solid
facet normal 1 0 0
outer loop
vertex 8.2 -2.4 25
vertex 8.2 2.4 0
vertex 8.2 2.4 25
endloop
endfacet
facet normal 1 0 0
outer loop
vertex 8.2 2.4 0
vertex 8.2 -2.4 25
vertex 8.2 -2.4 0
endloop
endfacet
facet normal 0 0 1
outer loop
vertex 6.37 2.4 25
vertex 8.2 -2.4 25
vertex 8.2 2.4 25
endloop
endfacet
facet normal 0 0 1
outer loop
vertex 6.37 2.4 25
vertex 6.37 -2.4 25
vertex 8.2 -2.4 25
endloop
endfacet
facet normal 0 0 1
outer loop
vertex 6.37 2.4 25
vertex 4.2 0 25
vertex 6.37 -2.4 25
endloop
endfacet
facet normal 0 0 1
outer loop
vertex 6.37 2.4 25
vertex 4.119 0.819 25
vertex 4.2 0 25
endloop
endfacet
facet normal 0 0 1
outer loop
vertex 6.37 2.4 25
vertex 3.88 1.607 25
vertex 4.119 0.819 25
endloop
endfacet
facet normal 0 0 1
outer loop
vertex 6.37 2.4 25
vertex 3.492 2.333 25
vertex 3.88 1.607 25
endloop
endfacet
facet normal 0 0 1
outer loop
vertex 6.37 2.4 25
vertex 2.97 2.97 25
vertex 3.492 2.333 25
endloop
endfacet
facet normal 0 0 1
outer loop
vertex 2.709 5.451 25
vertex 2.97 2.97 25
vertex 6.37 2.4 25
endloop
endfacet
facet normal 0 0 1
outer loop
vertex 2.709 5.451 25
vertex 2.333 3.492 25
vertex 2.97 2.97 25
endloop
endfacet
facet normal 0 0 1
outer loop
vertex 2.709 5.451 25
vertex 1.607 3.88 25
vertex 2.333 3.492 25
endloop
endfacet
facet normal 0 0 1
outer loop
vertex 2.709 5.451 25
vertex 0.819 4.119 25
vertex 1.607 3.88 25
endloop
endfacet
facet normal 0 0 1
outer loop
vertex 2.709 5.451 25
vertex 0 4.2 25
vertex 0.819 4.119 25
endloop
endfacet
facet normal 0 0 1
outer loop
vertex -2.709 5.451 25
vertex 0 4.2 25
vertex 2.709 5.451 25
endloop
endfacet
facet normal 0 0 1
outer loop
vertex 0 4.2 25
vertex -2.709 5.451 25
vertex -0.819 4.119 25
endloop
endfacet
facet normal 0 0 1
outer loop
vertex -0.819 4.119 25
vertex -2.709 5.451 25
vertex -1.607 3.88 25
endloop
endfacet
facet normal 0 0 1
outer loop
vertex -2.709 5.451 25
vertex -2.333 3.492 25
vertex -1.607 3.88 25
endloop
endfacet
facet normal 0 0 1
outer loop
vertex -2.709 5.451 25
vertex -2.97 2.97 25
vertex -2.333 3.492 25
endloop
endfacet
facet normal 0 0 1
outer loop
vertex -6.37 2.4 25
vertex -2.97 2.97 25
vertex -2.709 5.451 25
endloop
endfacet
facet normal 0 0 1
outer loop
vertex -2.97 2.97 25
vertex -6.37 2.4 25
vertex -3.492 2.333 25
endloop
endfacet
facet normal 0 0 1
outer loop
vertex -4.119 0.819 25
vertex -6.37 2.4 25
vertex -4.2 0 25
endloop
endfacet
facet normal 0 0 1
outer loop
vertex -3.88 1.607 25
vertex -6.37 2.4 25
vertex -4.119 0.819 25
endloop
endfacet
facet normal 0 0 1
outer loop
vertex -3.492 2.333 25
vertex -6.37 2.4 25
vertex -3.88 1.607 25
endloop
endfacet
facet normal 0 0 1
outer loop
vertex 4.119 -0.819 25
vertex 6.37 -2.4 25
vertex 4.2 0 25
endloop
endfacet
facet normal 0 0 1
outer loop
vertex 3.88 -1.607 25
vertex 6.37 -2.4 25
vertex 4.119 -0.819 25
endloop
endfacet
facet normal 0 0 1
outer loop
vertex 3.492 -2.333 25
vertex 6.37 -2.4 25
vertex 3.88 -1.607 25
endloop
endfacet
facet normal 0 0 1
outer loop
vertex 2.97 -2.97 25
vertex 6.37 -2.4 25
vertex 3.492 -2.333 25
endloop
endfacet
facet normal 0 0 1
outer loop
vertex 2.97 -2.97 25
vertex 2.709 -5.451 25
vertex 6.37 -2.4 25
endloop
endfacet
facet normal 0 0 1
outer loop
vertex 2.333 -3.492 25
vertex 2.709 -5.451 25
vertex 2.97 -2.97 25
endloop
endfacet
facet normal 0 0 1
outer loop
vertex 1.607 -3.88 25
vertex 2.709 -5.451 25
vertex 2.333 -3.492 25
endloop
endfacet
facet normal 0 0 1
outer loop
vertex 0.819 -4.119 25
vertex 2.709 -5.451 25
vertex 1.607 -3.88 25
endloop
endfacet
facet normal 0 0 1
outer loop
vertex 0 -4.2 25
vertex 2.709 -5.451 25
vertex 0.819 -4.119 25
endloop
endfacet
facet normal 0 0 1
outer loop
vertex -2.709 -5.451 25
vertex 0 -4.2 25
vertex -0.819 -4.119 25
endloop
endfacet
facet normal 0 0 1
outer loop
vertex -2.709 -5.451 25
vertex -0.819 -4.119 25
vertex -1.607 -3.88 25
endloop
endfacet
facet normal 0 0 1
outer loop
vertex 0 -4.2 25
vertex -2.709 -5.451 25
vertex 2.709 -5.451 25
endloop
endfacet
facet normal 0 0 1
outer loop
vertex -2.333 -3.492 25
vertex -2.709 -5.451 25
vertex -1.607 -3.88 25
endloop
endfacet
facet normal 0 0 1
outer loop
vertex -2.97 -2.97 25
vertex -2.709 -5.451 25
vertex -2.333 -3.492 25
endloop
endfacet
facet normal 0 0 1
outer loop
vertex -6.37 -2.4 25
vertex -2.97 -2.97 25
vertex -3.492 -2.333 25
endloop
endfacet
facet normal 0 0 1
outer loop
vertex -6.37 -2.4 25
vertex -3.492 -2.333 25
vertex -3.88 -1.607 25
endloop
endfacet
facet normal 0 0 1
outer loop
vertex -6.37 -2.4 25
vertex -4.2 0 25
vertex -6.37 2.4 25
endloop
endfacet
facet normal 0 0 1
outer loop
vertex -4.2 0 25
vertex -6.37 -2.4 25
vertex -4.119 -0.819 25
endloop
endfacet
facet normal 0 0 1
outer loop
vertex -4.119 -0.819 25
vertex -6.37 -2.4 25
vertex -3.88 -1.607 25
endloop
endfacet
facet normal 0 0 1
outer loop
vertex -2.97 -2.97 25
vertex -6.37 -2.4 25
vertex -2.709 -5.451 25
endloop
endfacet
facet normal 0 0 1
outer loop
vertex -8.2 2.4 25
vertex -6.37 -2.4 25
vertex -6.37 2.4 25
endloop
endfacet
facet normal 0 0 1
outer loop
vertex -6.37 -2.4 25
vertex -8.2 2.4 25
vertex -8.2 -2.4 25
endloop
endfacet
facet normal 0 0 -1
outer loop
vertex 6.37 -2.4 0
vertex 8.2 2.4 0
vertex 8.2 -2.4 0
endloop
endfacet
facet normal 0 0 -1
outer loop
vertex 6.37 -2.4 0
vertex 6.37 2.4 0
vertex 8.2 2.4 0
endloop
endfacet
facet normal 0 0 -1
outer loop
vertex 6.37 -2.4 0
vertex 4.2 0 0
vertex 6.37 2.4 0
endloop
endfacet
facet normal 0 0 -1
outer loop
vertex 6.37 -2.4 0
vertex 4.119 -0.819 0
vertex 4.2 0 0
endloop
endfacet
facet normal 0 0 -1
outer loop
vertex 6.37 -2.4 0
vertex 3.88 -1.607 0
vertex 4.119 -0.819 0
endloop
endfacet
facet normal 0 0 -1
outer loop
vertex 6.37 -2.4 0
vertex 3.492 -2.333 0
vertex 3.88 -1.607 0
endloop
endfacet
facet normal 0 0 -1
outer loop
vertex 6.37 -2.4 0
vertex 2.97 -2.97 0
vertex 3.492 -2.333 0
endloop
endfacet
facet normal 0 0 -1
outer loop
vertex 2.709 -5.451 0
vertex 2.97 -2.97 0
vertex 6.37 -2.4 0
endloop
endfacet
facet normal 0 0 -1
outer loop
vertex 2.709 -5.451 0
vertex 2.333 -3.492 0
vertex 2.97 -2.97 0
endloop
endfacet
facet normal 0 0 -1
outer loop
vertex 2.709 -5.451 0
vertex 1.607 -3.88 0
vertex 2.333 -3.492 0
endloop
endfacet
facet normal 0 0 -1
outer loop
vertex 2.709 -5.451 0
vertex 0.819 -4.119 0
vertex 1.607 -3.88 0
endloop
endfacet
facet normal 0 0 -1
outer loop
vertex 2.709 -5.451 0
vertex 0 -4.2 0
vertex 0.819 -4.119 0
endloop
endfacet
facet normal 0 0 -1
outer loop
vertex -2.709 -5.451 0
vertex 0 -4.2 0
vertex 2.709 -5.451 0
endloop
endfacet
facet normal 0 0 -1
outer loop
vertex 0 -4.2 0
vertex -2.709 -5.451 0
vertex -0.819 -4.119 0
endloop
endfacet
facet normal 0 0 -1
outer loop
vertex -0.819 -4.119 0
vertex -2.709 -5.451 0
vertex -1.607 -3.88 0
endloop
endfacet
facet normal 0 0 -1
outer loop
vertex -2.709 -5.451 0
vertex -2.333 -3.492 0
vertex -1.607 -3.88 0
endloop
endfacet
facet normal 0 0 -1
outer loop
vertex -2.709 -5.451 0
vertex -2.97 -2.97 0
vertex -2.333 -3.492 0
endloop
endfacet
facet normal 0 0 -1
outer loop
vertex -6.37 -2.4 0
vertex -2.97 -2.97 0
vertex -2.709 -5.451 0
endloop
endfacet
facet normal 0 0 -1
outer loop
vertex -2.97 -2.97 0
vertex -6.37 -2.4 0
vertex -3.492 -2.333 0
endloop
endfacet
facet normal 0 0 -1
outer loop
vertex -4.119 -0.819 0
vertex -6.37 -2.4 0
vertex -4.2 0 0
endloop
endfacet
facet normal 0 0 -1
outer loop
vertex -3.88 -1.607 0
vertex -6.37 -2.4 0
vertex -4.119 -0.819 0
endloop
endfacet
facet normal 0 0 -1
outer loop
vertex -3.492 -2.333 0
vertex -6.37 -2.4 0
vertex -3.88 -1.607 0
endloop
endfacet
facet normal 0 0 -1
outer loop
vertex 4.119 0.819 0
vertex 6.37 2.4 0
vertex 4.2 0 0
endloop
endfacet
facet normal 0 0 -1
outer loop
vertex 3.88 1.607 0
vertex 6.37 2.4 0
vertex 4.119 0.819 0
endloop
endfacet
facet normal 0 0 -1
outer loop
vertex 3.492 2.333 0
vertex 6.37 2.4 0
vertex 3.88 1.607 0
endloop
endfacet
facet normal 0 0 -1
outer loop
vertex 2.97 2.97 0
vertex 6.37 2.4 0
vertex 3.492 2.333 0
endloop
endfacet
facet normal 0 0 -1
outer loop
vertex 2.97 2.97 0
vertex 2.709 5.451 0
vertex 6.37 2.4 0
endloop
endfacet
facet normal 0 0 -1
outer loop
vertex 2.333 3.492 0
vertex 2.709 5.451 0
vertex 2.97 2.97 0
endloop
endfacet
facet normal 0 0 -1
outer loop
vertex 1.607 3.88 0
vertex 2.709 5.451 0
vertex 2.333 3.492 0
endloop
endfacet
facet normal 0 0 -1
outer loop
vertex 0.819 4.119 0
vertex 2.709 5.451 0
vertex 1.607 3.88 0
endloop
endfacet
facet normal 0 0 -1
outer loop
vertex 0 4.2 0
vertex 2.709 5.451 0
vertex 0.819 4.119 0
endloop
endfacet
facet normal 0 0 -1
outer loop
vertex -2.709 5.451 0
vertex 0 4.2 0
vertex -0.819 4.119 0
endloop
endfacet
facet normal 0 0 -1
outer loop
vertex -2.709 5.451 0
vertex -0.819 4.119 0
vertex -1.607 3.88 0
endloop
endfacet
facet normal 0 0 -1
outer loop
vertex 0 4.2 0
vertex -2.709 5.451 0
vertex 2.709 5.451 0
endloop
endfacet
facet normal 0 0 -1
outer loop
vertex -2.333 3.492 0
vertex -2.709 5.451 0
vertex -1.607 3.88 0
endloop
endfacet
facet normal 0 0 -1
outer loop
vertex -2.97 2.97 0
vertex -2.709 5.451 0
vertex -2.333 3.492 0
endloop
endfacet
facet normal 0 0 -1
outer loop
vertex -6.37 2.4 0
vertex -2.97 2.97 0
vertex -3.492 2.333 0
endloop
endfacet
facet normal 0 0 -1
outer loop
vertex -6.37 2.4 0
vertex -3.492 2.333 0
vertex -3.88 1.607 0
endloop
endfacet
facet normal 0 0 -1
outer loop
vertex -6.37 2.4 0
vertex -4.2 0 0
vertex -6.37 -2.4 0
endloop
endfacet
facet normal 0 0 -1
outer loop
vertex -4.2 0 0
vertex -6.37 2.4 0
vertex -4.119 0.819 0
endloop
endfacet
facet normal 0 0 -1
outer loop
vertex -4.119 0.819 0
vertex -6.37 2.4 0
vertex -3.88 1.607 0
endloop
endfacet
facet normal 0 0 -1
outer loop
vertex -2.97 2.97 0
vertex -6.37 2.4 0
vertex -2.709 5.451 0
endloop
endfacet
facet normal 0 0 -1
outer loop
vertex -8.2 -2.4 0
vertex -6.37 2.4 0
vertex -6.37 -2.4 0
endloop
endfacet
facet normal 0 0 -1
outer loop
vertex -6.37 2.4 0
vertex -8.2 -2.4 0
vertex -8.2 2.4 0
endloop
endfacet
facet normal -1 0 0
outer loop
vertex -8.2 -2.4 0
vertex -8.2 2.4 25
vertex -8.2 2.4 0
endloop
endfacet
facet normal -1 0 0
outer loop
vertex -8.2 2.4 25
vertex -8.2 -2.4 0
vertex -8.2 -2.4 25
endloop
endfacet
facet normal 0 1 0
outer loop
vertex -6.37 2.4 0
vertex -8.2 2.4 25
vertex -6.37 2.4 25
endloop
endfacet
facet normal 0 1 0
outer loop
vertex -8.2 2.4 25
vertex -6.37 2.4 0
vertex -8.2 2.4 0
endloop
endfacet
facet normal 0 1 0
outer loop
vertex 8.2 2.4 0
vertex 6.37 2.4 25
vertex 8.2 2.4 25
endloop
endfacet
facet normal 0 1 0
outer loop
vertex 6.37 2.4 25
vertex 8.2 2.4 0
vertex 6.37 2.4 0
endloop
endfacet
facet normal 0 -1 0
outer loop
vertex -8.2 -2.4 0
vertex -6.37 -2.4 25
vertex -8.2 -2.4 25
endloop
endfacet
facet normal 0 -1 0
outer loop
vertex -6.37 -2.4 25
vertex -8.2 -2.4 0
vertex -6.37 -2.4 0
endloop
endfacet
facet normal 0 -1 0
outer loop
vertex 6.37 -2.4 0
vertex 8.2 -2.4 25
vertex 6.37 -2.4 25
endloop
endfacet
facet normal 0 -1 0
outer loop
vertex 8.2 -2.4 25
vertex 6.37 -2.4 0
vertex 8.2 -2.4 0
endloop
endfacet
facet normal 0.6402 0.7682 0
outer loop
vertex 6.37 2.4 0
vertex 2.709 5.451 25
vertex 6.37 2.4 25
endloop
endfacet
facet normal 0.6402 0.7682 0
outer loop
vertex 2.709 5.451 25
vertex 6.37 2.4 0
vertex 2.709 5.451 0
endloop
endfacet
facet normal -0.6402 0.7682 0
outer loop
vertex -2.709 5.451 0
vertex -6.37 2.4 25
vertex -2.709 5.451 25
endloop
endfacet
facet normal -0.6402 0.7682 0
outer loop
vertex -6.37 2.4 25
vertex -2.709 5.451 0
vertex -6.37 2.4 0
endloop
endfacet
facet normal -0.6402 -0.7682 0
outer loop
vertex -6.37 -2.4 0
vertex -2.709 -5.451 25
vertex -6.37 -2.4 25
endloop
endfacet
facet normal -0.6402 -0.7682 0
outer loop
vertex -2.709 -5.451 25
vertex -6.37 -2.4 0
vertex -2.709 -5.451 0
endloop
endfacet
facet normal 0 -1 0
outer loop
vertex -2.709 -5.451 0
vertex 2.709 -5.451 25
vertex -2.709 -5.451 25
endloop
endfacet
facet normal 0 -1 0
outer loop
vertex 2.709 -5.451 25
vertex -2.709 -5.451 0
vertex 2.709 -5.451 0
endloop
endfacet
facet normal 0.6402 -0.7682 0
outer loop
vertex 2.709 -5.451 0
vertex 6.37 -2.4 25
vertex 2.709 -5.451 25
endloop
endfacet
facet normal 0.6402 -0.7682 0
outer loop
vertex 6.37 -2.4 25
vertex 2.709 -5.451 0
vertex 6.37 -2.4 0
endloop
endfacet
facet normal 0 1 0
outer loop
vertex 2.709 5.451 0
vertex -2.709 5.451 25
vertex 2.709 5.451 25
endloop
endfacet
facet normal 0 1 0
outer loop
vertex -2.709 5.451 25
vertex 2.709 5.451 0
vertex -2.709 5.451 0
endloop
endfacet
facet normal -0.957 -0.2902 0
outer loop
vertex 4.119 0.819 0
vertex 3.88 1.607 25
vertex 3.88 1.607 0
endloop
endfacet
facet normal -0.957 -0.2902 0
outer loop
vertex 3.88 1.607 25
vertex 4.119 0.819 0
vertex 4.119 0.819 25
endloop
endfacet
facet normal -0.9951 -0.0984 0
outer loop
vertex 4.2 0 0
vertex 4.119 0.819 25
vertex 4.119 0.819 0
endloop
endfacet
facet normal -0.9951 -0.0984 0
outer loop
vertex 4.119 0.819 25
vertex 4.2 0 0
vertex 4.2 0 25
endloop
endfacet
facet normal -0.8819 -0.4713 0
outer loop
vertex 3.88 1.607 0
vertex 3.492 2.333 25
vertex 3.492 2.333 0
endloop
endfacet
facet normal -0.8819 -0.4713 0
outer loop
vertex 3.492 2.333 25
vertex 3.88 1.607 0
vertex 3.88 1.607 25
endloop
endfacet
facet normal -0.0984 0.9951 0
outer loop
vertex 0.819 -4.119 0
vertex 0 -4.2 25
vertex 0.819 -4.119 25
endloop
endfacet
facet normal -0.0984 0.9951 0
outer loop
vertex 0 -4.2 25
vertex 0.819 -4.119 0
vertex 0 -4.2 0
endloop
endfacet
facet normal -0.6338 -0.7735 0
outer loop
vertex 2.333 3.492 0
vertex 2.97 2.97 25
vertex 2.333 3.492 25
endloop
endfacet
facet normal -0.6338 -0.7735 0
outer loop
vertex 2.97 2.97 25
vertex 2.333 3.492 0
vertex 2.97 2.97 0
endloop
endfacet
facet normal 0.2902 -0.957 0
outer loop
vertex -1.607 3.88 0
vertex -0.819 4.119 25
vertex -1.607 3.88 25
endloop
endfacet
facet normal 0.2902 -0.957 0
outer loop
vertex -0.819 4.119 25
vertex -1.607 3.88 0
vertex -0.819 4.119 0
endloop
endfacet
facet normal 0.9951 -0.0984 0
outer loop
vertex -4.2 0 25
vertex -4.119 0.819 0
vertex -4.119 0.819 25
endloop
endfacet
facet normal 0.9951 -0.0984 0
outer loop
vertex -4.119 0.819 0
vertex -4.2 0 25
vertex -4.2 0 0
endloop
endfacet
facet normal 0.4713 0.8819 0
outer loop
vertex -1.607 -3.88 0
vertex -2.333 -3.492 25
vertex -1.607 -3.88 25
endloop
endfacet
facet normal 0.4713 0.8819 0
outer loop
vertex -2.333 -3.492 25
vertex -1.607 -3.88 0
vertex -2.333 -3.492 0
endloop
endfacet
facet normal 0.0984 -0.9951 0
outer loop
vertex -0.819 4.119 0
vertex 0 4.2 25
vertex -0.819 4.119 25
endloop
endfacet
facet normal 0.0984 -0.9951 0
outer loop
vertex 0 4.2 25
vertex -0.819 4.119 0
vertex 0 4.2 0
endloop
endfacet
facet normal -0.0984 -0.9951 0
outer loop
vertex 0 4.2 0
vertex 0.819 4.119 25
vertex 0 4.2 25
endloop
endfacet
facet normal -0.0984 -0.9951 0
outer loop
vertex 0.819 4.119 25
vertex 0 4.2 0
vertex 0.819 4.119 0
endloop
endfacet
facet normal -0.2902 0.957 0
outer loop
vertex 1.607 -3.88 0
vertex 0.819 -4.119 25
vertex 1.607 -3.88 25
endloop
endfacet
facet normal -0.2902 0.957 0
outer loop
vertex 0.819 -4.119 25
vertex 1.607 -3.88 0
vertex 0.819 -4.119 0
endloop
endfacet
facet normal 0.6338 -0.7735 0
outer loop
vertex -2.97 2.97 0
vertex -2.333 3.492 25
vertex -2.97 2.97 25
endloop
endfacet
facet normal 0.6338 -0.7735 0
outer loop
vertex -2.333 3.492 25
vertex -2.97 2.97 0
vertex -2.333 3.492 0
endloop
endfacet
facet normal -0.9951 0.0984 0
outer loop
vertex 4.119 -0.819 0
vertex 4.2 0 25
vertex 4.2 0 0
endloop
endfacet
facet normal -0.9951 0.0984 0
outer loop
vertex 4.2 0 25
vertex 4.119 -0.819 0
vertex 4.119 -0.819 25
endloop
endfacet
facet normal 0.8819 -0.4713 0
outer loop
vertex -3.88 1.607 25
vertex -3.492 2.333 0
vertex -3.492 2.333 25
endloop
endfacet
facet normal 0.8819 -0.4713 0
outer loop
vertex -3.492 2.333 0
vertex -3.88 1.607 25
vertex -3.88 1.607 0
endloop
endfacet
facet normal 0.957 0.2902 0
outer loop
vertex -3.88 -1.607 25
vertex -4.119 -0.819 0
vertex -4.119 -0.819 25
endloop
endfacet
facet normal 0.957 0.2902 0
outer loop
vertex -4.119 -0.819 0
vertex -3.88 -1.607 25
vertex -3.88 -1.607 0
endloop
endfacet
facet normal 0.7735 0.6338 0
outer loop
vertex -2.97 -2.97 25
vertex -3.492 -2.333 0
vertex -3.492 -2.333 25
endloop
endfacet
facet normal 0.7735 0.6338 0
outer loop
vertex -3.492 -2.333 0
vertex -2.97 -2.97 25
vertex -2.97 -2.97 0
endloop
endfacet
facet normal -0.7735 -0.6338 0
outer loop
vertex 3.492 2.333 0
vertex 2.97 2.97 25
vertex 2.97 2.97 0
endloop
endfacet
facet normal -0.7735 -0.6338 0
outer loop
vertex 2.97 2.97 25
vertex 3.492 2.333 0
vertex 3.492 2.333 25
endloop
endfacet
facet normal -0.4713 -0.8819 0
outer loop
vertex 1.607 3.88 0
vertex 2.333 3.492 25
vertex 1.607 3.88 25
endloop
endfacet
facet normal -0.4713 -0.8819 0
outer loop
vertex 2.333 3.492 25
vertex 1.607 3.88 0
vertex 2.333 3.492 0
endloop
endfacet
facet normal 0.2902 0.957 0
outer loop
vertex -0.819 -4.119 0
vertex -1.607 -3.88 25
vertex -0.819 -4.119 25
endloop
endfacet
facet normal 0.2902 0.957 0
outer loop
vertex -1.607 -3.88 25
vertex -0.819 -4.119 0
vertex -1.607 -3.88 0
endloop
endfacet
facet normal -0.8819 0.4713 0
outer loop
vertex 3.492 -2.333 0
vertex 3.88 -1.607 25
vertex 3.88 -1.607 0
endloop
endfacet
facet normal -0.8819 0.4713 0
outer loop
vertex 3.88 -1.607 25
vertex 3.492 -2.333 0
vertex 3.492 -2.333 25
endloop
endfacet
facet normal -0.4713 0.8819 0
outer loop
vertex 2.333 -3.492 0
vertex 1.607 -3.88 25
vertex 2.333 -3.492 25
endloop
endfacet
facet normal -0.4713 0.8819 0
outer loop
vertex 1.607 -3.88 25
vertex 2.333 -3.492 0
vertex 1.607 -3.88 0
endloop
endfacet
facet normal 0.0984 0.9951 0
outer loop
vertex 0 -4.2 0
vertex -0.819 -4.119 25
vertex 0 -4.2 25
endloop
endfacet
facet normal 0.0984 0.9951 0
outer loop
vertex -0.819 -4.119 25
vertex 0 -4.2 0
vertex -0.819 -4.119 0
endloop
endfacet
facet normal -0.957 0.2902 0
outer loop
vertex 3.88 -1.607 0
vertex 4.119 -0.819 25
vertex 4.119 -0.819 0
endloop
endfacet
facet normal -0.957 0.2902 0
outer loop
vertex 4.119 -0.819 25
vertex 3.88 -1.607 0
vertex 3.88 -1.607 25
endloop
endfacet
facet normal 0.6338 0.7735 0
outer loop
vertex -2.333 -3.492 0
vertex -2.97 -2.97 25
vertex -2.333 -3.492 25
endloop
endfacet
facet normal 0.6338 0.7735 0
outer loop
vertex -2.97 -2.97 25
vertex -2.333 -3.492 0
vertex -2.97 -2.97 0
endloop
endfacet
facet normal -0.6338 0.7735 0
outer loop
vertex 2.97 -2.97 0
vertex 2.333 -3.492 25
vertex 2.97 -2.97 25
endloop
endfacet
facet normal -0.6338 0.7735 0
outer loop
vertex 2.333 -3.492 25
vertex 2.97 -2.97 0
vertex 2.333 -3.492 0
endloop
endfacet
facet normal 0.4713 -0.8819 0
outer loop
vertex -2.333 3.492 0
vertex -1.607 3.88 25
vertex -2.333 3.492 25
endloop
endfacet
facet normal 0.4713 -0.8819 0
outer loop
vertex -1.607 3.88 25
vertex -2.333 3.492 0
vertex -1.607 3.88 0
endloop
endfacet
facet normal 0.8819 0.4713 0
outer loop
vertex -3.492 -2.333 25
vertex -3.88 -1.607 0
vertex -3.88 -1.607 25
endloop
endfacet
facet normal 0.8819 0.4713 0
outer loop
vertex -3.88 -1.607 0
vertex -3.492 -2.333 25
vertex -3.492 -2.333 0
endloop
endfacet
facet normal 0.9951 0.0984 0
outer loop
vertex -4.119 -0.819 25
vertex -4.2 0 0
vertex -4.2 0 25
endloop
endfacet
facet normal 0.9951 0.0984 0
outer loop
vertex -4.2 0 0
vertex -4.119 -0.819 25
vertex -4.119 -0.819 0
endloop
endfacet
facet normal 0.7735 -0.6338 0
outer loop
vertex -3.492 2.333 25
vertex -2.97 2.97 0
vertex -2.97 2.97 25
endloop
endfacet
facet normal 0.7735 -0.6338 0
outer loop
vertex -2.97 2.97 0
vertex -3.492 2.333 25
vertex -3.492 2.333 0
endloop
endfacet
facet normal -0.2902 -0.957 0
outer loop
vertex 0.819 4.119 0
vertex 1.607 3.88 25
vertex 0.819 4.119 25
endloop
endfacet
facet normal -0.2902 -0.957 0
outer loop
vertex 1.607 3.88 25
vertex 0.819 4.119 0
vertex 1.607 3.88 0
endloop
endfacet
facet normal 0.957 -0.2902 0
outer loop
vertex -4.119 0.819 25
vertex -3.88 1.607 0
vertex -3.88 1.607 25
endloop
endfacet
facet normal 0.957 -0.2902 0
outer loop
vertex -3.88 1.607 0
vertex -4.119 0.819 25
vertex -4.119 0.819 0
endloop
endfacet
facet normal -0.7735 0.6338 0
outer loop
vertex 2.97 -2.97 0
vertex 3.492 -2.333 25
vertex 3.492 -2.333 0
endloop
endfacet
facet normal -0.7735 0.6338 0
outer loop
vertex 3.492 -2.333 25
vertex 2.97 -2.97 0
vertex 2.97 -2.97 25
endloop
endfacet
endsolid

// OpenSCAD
height = 25;

bar_width = 16.4;
bar_height = 4.8;

inner_r = 4.2;
outer_r = 5.9;

difference() {
  union() {
    translate([bar_width / -2, bar_height / -2, 0]) {
      cube([bar_width, bar_height, height]);
    }
    rotate(90, [0, 0, 1]) {
      scale([1, 1.2, 1]) {
        rotate(22.5, [0, 0, 1]) cylinder(h = height, r = outer_r, $fn = 8);
      }
    }
  }
  cylinder(h = height, r = inner_r, $fn = 32);
}
